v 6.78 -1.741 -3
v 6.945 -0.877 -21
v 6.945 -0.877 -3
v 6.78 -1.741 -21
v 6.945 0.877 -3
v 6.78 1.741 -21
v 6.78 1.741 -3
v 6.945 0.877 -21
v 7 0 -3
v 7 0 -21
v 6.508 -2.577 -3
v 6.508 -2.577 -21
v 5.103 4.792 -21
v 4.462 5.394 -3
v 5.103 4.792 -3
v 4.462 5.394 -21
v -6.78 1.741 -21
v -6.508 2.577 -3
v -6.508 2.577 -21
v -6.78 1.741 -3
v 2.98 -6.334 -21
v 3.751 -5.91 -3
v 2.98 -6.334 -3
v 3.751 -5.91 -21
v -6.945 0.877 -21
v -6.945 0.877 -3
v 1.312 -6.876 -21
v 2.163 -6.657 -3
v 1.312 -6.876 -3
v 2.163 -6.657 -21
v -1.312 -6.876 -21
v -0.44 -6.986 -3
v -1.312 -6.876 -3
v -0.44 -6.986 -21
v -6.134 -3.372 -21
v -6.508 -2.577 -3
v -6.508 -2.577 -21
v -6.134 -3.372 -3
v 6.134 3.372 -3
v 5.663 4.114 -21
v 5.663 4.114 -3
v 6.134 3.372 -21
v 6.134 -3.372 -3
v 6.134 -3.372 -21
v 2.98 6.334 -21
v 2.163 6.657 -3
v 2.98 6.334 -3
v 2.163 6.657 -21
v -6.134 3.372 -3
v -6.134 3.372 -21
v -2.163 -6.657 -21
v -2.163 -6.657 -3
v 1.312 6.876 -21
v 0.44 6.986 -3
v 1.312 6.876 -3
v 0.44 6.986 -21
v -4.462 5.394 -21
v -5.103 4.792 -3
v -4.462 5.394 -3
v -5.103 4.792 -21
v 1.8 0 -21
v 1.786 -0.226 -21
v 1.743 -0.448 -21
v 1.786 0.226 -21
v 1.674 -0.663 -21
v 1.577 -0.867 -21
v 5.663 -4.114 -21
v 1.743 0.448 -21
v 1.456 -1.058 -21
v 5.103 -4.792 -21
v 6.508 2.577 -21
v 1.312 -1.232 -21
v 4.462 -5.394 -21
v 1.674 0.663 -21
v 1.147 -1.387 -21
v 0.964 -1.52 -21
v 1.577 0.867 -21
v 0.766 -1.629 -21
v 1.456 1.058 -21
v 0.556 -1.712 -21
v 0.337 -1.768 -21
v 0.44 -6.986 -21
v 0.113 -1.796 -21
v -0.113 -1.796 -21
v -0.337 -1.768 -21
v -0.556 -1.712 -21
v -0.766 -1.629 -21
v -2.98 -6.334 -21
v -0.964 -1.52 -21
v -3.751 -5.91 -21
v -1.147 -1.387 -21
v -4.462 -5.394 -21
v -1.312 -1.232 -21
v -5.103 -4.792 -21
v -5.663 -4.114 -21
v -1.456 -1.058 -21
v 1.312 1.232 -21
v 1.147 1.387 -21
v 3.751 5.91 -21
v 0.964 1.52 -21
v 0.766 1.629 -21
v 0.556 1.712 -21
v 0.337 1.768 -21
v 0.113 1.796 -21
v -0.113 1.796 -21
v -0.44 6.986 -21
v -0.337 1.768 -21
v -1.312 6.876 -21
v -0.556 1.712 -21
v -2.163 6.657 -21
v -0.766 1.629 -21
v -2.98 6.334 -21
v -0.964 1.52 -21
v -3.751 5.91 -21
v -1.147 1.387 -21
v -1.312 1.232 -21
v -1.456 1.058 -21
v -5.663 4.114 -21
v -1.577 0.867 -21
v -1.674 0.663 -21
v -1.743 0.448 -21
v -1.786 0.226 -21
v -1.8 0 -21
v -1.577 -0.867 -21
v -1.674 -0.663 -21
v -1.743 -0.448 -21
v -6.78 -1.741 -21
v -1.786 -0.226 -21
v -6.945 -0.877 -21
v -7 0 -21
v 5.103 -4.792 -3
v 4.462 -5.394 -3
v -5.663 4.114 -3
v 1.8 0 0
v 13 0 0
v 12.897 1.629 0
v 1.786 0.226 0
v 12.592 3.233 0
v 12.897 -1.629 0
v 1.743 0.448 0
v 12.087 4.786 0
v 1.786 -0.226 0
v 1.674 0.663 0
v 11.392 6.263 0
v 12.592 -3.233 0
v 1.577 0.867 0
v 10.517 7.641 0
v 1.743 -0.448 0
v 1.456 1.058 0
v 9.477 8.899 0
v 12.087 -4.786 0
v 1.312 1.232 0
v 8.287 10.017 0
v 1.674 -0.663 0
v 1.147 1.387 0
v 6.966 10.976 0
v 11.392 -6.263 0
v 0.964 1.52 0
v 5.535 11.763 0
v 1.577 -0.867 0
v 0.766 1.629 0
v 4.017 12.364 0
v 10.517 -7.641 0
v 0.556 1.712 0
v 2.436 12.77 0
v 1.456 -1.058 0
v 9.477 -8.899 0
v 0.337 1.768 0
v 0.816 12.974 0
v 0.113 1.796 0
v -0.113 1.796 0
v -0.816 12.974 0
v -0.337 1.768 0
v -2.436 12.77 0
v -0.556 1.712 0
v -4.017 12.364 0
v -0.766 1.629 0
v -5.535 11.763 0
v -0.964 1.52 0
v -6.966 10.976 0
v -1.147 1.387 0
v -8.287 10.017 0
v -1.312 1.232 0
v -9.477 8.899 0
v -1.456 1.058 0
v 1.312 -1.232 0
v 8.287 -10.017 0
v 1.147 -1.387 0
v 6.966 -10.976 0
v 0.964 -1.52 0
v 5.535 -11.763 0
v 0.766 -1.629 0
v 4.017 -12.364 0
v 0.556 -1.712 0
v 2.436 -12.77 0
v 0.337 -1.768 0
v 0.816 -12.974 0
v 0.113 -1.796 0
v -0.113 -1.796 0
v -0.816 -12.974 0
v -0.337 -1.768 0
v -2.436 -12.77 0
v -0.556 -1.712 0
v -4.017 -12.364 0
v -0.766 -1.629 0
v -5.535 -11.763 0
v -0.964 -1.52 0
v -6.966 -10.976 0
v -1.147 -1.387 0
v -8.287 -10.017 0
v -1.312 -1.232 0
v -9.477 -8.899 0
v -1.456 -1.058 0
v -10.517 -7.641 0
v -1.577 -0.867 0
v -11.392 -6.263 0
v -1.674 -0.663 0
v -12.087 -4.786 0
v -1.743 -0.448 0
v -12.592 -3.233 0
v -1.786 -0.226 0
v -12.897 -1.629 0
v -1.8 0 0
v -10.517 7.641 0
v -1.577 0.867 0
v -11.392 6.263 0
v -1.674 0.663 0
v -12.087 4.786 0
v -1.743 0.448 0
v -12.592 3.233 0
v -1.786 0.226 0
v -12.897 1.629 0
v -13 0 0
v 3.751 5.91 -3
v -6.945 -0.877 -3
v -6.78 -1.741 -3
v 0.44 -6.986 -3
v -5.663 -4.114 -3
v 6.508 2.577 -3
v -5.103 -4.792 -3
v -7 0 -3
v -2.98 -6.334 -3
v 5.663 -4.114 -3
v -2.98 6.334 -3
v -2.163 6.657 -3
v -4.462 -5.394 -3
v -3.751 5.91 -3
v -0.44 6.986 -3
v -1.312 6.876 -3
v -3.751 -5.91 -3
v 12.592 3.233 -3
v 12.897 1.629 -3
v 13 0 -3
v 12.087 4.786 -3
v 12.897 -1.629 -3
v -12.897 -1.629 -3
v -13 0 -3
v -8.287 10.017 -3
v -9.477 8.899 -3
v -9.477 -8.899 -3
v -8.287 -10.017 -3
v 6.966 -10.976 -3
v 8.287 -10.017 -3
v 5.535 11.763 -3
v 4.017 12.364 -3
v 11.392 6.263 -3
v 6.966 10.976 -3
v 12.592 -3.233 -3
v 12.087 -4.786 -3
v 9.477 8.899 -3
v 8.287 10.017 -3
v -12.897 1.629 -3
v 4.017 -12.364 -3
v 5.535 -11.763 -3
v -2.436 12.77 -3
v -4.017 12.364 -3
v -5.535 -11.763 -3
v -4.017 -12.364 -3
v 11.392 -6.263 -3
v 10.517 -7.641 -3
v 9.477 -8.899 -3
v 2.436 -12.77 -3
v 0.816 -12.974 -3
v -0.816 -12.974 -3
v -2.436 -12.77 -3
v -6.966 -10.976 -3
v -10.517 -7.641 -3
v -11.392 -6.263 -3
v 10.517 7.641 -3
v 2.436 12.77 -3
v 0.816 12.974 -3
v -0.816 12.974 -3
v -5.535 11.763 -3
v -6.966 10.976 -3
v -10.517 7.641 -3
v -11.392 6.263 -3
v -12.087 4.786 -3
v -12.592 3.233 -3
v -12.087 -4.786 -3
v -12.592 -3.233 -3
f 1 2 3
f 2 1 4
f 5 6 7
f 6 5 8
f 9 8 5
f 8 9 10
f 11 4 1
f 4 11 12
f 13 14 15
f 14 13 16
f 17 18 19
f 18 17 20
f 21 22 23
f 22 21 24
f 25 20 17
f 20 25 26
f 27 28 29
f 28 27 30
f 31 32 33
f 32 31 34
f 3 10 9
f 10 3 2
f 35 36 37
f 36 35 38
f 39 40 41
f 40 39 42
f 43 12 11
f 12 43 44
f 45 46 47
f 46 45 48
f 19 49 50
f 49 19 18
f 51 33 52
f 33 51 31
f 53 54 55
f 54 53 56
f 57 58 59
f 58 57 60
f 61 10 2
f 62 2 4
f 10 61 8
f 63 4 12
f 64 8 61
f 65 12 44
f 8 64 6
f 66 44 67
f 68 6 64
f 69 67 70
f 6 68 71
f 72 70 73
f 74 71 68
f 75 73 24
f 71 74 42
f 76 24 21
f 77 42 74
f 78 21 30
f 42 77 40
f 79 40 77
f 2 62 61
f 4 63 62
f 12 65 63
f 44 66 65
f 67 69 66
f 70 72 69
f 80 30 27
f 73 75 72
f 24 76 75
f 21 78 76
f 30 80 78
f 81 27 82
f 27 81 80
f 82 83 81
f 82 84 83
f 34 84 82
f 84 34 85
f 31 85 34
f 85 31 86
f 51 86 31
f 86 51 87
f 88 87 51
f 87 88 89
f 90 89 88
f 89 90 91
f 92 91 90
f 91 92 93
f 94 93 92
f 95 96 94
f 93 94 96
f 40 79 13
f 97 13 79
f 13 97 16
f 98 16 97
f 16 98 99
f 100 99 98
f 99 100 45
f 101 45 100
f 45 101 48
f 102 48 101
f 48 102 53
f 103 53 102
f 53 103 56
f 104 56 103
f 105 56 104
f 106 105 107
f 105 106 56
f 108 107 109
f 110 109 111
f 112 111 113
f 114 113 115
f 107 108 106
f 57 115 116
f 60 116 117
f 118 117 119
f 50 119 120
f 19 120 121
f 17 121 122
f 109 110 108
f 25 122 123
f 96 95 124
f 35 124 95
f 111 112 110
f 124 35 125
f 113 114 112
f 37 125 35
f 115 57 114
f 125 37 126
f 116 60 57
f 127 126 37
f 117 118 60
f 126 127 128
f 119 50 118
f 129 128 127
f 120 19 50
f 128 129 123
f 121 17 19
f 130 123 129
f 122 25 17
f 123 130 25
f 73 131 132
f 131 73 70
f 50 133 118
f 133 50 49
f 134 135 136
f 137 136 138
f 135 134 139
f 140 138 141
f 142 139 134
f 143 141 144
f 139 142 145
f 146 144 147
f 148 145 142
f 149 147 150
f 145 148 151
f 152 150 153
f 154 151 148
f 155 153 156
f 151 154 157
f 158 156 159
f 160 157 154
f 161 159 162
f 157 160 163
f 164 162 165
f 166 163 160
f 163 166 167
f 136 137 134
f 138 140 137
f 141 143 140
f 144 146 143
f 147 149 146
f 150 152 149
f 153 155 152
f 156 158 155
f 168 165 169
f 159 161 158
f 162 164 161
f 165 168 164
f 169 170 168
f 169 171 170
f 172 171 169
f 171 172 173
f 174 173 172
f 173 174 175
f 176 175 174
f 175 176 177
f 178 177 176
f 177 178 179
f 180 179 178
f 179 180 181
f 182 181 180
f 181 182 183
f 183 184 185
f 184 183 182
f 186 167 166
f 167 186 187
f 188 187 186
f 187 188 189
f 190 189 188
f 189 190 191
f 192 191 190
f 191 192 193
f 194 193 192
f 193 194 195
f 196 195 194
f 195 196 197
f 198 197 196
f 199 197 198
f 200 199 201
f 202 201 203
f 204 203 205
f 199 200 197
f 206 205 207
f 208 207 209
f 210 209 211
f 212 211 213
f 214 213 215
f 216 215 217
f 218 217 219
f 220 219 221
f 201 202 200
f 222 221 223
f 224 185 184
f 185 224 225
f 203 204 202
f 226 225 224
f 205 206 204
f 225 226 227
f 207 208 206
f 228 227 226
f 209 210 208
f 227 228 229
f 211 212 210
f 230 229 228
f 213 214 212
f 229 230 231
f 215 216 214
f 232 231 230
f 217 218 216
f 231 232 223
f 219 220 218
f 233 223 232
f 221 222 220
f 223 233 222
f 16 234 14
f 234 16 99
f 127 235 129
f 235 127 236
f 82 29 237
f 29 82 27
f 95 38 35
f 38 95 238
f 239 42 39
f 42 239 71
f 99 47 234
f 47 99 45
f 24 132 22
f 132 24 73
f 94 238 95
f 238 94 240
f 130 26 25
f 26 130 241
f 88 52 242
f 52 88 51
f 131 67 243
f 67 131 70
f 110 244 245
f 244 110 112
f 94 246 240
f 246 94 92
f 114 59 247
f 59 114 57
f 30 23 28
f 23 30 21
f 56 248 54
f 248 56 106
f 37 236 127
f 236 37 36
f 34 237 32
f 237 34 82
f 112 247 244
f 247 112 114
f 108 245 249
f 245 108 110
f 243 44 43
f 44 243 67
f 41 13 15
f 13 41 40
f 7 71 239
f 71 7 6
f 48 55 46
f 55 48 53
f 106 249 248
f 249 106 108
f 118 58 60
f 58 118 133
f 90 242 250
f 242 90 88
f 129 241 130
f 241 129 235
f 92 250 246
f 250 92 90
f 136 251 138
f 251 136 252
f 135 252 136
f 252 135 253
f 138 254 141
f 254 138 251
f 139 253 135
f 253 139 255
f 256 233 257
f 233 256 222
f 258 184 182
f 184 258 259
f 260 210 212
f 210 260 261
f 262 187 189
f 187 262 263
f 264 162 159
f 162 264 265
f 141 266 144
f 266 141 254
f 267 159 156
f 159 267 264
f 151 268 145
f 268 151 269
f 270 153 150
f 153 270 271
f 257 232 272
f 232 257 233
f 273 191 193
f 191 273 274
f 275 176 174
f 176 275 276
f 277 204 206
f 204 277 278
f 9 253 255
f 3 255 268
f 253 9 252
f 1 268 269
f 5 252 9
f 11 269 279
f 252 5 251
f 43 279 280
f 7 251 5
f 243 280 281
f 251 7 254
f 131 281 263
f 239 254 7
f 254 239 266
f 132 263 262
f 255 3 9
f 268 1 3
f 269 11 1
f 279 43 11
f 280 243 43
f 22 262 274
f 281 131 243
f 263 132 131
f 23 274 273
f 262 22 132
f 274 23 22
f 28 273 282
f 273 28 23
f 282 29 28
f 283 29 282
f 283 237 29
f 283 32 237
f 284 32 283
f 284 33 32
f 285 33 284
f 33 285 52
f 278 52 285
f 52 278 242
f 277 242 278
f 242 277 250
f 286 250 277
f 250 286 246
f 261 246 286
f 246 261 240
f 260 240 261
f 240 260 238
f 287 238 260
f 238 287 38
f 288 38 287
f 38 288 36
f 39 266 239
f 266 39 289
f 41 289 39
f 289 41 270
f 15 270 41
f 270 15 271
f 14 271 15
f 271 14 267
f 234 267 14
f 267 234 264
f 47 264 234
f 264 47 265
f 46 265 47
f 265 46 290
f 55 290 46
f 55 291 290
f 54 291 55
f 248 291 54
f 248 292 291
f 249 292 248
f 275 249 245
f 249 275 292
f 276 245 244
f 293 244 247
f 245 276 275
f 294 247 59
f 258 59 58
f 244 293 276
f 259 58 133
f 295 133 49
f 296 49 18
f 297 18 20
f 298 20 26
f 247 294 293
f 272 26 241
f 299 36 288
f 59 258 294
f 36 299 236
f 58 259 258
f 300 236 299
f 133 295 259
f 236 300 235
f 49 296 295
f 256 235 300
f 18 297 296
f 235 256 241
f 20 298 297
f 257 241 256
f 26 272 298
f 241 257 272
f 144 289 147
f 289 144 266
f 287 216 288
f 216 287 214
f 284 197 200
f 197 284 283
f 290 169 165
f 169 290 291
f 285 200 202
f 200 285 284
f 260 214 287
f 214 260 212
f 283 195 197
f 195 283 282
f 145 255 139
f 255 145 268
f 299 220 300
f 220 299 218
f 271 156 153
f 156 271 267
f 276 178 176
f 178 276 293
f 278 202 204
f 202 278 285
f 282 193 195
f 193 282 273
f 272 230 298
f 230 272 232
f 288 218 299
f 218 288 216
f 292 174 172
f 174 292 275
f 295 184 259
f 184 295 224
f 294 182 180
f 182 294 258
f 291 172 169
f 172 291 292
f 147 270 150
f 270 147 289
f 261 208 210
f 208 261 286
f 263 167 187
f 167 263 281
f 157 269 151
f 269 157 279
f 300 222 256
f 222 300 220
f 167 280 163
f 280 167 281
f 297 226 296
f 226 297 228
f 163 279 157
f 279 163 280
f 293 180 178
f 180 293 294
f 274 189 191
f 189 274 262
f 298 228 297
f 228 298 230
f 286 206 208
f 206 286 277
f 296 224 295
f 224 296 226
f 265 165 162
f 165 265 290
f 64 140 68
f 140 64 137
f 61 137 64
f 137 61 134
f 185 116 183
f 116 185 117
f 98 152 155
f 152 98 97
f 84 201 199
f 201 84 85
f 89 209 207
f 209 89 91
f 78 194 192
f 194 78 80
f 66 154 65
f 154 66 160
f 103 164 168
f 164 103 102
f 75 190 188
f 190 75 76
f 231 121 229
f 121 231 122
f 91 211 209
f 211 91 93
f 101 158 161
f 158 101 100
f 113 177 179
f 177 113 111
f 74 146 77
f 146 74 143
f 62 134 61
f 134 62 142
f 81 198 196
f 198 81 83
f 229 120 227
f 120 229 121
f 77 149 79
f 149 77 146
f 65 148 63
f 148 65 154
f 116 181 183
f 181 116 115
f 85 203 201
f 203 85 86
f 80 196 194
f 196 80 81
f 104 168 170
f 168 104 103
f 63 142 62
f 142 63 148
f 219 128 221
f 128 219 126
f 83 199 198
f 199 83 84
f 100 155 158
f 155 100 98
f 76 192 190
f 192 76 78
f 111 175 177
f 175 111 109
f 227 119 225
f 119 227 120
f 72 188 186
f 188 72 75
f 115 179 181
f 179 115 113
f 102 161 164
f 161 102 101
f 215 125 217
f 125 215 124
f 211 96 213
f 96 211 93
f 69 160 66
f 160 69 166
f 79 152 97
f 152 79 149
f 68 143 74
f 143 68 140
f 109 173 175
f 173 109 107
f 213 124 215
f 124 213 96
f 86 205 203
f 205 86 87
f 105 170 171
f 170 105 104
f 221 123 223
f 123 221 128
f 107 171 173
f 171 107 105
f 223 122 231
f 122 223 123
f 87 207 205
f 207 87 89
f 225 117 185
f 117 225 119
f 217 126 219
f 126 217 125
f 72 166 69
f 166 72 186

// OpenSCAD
$fn = 50;


difference() {
	union() {
		translate(v = [0, 0, -21.0000000000]) {
			cylinder(h = 21, r = 7.0000000000);
		}
		translate(v = [0, 0, -3.0000000000]) {
			cylinder(h = 3, r = 13.0000000000);
		}
	}
	union() {
		#translate(v = [0, 0, -21]) {
			cylinder(h = 21, r = 1.8000000000);
		}
	}
}
